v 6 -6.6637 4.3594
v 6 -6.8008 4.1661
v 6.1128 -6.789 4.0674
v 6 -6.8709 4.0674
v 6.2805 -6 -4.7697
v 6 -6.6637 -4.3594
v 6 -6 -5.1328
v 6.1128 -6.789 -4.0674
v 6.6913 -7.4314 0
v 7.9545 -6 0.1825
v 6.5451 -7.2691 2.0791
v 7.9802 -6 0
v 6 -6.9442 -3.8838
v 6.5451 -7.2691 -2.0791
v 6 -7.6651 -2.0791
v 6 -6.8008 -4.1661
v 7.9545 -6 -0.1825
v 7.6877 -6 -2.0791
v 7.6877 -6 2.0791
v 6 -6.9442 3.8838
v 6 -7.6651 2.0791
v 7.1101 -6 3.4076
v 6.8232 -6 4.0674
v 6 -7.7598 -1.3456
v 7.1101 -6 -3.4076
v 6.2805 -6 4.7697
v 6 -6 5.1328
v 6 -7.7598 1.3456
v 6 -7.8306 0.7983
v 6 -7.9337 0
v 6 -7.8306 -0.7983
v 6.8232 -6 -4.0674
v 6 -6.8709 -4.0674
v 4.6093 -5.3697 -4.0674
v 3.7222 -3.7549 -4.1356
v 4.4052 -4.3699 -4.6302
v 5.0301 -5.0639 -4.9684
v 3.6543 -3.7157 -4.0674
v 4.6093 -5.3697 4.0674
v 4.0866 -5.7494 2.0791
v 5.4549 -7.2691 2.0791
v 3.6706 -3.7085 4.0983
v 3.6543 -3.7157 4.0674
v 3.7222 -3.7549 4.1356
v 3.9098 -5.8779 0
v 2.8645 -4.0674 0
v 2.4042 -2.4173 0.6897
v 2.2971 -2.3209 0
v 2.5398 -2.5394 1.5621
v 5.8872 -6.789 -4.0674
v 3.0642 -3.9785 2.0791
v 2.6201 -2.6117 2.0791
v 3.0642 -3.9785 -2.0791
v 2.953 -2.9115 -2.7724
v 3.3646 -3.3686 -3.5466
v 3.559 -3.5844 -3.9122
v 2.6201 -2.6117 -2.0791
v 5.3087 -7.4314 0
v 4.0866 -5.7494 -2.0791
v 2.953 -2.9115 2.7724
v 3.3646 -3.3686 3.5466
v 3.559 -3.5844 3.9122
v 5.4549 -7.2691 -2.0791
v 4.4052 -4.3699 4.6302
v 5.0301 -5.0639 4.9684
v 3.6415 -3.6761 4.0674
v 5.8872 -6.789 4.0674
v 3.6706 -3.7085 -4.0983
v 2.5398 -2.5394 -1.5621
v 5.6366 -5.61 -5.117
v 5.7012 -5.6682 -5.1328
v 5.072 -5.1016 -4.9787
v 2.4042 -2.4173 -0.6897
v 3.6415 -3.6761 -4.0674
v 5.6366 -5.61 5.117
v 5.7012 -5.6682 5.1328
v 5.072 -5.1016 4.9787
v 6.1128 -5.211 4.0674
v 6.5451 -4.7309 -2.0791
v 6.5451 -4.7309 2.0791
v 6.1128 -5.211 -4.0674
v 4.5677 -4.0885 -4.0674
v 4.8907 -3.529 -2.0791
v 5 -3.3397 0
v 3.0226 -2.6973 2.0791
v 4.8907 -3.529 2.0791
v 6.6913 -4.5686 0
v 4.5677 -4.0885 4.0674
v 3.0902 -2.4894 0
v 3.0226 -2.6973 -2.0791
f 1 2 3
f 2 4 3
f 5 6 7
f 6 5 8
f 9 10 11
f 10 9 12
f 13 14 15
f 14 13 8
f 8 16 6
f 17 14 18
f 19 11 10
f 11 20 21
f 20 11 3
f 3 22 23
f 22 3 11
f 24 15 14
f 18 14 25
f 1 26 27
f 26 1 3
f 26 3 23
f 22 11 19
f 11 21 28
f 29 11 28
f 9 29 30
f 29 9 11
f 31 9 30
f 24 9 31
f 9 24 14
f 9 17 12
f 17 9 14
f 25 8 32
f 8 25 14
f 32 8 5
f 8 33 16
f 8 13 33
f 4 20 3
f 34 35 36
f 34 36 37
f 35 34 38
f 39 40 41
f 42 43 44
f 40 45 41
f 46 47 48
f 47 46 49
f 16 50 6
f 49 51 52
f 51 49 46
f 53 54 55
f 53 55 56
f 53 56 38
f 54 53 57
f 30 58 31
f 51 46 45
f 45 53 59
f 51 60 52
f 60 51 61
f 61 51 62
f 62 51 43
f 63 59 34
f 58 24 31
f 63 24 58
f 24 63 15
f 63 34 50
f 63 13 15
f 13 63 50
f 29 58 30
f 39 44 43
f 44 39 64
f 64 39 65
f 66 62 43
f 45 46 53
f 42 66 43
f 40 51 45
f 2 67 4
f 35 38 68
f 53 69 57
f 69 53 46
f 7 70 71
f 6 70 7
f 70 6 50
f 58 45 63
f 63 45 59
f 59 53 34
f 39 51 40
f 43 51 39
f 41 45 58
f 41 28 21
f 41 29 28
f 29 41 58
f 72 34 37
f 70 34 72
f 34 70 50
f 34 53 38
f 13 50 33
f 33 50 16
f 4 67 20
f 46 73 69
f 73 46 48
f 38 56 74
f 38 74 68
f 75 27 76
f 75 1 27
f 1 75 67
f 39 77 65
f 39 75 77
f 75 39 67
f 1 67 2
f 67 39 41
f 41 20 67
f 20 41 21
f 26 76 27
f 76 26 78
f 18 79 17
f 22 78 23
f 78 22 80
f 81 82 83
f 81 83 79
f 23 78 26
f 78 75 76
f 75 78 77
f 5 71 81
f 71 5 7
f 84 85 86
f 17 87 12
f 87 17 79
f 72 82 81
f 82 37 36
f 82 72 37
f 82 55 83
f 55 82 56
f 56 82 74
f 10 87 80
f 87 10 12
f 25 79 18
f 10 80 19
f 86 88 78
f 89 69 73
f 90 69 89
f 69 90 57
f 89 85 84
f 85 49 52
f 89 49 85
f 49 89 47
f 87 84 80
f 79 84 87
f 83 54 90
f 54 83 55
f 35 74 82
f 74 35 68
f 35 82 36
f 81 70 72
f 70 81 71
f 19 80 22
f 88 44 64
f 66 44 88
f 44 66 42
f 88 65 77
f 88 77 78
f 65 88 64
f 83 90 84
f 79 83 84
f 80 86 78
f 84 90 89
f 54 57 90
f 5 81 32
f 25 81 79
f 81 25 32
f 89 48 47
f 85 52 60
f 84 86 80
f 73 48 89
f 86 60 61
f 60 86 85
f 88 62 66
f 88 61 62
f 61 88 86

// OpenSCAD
intersection() {
    sphere(r=10);
    translate([12,0,0])
        sphere(r=10);
    translate([0,-12,0])
        sphere(r=10);
}
